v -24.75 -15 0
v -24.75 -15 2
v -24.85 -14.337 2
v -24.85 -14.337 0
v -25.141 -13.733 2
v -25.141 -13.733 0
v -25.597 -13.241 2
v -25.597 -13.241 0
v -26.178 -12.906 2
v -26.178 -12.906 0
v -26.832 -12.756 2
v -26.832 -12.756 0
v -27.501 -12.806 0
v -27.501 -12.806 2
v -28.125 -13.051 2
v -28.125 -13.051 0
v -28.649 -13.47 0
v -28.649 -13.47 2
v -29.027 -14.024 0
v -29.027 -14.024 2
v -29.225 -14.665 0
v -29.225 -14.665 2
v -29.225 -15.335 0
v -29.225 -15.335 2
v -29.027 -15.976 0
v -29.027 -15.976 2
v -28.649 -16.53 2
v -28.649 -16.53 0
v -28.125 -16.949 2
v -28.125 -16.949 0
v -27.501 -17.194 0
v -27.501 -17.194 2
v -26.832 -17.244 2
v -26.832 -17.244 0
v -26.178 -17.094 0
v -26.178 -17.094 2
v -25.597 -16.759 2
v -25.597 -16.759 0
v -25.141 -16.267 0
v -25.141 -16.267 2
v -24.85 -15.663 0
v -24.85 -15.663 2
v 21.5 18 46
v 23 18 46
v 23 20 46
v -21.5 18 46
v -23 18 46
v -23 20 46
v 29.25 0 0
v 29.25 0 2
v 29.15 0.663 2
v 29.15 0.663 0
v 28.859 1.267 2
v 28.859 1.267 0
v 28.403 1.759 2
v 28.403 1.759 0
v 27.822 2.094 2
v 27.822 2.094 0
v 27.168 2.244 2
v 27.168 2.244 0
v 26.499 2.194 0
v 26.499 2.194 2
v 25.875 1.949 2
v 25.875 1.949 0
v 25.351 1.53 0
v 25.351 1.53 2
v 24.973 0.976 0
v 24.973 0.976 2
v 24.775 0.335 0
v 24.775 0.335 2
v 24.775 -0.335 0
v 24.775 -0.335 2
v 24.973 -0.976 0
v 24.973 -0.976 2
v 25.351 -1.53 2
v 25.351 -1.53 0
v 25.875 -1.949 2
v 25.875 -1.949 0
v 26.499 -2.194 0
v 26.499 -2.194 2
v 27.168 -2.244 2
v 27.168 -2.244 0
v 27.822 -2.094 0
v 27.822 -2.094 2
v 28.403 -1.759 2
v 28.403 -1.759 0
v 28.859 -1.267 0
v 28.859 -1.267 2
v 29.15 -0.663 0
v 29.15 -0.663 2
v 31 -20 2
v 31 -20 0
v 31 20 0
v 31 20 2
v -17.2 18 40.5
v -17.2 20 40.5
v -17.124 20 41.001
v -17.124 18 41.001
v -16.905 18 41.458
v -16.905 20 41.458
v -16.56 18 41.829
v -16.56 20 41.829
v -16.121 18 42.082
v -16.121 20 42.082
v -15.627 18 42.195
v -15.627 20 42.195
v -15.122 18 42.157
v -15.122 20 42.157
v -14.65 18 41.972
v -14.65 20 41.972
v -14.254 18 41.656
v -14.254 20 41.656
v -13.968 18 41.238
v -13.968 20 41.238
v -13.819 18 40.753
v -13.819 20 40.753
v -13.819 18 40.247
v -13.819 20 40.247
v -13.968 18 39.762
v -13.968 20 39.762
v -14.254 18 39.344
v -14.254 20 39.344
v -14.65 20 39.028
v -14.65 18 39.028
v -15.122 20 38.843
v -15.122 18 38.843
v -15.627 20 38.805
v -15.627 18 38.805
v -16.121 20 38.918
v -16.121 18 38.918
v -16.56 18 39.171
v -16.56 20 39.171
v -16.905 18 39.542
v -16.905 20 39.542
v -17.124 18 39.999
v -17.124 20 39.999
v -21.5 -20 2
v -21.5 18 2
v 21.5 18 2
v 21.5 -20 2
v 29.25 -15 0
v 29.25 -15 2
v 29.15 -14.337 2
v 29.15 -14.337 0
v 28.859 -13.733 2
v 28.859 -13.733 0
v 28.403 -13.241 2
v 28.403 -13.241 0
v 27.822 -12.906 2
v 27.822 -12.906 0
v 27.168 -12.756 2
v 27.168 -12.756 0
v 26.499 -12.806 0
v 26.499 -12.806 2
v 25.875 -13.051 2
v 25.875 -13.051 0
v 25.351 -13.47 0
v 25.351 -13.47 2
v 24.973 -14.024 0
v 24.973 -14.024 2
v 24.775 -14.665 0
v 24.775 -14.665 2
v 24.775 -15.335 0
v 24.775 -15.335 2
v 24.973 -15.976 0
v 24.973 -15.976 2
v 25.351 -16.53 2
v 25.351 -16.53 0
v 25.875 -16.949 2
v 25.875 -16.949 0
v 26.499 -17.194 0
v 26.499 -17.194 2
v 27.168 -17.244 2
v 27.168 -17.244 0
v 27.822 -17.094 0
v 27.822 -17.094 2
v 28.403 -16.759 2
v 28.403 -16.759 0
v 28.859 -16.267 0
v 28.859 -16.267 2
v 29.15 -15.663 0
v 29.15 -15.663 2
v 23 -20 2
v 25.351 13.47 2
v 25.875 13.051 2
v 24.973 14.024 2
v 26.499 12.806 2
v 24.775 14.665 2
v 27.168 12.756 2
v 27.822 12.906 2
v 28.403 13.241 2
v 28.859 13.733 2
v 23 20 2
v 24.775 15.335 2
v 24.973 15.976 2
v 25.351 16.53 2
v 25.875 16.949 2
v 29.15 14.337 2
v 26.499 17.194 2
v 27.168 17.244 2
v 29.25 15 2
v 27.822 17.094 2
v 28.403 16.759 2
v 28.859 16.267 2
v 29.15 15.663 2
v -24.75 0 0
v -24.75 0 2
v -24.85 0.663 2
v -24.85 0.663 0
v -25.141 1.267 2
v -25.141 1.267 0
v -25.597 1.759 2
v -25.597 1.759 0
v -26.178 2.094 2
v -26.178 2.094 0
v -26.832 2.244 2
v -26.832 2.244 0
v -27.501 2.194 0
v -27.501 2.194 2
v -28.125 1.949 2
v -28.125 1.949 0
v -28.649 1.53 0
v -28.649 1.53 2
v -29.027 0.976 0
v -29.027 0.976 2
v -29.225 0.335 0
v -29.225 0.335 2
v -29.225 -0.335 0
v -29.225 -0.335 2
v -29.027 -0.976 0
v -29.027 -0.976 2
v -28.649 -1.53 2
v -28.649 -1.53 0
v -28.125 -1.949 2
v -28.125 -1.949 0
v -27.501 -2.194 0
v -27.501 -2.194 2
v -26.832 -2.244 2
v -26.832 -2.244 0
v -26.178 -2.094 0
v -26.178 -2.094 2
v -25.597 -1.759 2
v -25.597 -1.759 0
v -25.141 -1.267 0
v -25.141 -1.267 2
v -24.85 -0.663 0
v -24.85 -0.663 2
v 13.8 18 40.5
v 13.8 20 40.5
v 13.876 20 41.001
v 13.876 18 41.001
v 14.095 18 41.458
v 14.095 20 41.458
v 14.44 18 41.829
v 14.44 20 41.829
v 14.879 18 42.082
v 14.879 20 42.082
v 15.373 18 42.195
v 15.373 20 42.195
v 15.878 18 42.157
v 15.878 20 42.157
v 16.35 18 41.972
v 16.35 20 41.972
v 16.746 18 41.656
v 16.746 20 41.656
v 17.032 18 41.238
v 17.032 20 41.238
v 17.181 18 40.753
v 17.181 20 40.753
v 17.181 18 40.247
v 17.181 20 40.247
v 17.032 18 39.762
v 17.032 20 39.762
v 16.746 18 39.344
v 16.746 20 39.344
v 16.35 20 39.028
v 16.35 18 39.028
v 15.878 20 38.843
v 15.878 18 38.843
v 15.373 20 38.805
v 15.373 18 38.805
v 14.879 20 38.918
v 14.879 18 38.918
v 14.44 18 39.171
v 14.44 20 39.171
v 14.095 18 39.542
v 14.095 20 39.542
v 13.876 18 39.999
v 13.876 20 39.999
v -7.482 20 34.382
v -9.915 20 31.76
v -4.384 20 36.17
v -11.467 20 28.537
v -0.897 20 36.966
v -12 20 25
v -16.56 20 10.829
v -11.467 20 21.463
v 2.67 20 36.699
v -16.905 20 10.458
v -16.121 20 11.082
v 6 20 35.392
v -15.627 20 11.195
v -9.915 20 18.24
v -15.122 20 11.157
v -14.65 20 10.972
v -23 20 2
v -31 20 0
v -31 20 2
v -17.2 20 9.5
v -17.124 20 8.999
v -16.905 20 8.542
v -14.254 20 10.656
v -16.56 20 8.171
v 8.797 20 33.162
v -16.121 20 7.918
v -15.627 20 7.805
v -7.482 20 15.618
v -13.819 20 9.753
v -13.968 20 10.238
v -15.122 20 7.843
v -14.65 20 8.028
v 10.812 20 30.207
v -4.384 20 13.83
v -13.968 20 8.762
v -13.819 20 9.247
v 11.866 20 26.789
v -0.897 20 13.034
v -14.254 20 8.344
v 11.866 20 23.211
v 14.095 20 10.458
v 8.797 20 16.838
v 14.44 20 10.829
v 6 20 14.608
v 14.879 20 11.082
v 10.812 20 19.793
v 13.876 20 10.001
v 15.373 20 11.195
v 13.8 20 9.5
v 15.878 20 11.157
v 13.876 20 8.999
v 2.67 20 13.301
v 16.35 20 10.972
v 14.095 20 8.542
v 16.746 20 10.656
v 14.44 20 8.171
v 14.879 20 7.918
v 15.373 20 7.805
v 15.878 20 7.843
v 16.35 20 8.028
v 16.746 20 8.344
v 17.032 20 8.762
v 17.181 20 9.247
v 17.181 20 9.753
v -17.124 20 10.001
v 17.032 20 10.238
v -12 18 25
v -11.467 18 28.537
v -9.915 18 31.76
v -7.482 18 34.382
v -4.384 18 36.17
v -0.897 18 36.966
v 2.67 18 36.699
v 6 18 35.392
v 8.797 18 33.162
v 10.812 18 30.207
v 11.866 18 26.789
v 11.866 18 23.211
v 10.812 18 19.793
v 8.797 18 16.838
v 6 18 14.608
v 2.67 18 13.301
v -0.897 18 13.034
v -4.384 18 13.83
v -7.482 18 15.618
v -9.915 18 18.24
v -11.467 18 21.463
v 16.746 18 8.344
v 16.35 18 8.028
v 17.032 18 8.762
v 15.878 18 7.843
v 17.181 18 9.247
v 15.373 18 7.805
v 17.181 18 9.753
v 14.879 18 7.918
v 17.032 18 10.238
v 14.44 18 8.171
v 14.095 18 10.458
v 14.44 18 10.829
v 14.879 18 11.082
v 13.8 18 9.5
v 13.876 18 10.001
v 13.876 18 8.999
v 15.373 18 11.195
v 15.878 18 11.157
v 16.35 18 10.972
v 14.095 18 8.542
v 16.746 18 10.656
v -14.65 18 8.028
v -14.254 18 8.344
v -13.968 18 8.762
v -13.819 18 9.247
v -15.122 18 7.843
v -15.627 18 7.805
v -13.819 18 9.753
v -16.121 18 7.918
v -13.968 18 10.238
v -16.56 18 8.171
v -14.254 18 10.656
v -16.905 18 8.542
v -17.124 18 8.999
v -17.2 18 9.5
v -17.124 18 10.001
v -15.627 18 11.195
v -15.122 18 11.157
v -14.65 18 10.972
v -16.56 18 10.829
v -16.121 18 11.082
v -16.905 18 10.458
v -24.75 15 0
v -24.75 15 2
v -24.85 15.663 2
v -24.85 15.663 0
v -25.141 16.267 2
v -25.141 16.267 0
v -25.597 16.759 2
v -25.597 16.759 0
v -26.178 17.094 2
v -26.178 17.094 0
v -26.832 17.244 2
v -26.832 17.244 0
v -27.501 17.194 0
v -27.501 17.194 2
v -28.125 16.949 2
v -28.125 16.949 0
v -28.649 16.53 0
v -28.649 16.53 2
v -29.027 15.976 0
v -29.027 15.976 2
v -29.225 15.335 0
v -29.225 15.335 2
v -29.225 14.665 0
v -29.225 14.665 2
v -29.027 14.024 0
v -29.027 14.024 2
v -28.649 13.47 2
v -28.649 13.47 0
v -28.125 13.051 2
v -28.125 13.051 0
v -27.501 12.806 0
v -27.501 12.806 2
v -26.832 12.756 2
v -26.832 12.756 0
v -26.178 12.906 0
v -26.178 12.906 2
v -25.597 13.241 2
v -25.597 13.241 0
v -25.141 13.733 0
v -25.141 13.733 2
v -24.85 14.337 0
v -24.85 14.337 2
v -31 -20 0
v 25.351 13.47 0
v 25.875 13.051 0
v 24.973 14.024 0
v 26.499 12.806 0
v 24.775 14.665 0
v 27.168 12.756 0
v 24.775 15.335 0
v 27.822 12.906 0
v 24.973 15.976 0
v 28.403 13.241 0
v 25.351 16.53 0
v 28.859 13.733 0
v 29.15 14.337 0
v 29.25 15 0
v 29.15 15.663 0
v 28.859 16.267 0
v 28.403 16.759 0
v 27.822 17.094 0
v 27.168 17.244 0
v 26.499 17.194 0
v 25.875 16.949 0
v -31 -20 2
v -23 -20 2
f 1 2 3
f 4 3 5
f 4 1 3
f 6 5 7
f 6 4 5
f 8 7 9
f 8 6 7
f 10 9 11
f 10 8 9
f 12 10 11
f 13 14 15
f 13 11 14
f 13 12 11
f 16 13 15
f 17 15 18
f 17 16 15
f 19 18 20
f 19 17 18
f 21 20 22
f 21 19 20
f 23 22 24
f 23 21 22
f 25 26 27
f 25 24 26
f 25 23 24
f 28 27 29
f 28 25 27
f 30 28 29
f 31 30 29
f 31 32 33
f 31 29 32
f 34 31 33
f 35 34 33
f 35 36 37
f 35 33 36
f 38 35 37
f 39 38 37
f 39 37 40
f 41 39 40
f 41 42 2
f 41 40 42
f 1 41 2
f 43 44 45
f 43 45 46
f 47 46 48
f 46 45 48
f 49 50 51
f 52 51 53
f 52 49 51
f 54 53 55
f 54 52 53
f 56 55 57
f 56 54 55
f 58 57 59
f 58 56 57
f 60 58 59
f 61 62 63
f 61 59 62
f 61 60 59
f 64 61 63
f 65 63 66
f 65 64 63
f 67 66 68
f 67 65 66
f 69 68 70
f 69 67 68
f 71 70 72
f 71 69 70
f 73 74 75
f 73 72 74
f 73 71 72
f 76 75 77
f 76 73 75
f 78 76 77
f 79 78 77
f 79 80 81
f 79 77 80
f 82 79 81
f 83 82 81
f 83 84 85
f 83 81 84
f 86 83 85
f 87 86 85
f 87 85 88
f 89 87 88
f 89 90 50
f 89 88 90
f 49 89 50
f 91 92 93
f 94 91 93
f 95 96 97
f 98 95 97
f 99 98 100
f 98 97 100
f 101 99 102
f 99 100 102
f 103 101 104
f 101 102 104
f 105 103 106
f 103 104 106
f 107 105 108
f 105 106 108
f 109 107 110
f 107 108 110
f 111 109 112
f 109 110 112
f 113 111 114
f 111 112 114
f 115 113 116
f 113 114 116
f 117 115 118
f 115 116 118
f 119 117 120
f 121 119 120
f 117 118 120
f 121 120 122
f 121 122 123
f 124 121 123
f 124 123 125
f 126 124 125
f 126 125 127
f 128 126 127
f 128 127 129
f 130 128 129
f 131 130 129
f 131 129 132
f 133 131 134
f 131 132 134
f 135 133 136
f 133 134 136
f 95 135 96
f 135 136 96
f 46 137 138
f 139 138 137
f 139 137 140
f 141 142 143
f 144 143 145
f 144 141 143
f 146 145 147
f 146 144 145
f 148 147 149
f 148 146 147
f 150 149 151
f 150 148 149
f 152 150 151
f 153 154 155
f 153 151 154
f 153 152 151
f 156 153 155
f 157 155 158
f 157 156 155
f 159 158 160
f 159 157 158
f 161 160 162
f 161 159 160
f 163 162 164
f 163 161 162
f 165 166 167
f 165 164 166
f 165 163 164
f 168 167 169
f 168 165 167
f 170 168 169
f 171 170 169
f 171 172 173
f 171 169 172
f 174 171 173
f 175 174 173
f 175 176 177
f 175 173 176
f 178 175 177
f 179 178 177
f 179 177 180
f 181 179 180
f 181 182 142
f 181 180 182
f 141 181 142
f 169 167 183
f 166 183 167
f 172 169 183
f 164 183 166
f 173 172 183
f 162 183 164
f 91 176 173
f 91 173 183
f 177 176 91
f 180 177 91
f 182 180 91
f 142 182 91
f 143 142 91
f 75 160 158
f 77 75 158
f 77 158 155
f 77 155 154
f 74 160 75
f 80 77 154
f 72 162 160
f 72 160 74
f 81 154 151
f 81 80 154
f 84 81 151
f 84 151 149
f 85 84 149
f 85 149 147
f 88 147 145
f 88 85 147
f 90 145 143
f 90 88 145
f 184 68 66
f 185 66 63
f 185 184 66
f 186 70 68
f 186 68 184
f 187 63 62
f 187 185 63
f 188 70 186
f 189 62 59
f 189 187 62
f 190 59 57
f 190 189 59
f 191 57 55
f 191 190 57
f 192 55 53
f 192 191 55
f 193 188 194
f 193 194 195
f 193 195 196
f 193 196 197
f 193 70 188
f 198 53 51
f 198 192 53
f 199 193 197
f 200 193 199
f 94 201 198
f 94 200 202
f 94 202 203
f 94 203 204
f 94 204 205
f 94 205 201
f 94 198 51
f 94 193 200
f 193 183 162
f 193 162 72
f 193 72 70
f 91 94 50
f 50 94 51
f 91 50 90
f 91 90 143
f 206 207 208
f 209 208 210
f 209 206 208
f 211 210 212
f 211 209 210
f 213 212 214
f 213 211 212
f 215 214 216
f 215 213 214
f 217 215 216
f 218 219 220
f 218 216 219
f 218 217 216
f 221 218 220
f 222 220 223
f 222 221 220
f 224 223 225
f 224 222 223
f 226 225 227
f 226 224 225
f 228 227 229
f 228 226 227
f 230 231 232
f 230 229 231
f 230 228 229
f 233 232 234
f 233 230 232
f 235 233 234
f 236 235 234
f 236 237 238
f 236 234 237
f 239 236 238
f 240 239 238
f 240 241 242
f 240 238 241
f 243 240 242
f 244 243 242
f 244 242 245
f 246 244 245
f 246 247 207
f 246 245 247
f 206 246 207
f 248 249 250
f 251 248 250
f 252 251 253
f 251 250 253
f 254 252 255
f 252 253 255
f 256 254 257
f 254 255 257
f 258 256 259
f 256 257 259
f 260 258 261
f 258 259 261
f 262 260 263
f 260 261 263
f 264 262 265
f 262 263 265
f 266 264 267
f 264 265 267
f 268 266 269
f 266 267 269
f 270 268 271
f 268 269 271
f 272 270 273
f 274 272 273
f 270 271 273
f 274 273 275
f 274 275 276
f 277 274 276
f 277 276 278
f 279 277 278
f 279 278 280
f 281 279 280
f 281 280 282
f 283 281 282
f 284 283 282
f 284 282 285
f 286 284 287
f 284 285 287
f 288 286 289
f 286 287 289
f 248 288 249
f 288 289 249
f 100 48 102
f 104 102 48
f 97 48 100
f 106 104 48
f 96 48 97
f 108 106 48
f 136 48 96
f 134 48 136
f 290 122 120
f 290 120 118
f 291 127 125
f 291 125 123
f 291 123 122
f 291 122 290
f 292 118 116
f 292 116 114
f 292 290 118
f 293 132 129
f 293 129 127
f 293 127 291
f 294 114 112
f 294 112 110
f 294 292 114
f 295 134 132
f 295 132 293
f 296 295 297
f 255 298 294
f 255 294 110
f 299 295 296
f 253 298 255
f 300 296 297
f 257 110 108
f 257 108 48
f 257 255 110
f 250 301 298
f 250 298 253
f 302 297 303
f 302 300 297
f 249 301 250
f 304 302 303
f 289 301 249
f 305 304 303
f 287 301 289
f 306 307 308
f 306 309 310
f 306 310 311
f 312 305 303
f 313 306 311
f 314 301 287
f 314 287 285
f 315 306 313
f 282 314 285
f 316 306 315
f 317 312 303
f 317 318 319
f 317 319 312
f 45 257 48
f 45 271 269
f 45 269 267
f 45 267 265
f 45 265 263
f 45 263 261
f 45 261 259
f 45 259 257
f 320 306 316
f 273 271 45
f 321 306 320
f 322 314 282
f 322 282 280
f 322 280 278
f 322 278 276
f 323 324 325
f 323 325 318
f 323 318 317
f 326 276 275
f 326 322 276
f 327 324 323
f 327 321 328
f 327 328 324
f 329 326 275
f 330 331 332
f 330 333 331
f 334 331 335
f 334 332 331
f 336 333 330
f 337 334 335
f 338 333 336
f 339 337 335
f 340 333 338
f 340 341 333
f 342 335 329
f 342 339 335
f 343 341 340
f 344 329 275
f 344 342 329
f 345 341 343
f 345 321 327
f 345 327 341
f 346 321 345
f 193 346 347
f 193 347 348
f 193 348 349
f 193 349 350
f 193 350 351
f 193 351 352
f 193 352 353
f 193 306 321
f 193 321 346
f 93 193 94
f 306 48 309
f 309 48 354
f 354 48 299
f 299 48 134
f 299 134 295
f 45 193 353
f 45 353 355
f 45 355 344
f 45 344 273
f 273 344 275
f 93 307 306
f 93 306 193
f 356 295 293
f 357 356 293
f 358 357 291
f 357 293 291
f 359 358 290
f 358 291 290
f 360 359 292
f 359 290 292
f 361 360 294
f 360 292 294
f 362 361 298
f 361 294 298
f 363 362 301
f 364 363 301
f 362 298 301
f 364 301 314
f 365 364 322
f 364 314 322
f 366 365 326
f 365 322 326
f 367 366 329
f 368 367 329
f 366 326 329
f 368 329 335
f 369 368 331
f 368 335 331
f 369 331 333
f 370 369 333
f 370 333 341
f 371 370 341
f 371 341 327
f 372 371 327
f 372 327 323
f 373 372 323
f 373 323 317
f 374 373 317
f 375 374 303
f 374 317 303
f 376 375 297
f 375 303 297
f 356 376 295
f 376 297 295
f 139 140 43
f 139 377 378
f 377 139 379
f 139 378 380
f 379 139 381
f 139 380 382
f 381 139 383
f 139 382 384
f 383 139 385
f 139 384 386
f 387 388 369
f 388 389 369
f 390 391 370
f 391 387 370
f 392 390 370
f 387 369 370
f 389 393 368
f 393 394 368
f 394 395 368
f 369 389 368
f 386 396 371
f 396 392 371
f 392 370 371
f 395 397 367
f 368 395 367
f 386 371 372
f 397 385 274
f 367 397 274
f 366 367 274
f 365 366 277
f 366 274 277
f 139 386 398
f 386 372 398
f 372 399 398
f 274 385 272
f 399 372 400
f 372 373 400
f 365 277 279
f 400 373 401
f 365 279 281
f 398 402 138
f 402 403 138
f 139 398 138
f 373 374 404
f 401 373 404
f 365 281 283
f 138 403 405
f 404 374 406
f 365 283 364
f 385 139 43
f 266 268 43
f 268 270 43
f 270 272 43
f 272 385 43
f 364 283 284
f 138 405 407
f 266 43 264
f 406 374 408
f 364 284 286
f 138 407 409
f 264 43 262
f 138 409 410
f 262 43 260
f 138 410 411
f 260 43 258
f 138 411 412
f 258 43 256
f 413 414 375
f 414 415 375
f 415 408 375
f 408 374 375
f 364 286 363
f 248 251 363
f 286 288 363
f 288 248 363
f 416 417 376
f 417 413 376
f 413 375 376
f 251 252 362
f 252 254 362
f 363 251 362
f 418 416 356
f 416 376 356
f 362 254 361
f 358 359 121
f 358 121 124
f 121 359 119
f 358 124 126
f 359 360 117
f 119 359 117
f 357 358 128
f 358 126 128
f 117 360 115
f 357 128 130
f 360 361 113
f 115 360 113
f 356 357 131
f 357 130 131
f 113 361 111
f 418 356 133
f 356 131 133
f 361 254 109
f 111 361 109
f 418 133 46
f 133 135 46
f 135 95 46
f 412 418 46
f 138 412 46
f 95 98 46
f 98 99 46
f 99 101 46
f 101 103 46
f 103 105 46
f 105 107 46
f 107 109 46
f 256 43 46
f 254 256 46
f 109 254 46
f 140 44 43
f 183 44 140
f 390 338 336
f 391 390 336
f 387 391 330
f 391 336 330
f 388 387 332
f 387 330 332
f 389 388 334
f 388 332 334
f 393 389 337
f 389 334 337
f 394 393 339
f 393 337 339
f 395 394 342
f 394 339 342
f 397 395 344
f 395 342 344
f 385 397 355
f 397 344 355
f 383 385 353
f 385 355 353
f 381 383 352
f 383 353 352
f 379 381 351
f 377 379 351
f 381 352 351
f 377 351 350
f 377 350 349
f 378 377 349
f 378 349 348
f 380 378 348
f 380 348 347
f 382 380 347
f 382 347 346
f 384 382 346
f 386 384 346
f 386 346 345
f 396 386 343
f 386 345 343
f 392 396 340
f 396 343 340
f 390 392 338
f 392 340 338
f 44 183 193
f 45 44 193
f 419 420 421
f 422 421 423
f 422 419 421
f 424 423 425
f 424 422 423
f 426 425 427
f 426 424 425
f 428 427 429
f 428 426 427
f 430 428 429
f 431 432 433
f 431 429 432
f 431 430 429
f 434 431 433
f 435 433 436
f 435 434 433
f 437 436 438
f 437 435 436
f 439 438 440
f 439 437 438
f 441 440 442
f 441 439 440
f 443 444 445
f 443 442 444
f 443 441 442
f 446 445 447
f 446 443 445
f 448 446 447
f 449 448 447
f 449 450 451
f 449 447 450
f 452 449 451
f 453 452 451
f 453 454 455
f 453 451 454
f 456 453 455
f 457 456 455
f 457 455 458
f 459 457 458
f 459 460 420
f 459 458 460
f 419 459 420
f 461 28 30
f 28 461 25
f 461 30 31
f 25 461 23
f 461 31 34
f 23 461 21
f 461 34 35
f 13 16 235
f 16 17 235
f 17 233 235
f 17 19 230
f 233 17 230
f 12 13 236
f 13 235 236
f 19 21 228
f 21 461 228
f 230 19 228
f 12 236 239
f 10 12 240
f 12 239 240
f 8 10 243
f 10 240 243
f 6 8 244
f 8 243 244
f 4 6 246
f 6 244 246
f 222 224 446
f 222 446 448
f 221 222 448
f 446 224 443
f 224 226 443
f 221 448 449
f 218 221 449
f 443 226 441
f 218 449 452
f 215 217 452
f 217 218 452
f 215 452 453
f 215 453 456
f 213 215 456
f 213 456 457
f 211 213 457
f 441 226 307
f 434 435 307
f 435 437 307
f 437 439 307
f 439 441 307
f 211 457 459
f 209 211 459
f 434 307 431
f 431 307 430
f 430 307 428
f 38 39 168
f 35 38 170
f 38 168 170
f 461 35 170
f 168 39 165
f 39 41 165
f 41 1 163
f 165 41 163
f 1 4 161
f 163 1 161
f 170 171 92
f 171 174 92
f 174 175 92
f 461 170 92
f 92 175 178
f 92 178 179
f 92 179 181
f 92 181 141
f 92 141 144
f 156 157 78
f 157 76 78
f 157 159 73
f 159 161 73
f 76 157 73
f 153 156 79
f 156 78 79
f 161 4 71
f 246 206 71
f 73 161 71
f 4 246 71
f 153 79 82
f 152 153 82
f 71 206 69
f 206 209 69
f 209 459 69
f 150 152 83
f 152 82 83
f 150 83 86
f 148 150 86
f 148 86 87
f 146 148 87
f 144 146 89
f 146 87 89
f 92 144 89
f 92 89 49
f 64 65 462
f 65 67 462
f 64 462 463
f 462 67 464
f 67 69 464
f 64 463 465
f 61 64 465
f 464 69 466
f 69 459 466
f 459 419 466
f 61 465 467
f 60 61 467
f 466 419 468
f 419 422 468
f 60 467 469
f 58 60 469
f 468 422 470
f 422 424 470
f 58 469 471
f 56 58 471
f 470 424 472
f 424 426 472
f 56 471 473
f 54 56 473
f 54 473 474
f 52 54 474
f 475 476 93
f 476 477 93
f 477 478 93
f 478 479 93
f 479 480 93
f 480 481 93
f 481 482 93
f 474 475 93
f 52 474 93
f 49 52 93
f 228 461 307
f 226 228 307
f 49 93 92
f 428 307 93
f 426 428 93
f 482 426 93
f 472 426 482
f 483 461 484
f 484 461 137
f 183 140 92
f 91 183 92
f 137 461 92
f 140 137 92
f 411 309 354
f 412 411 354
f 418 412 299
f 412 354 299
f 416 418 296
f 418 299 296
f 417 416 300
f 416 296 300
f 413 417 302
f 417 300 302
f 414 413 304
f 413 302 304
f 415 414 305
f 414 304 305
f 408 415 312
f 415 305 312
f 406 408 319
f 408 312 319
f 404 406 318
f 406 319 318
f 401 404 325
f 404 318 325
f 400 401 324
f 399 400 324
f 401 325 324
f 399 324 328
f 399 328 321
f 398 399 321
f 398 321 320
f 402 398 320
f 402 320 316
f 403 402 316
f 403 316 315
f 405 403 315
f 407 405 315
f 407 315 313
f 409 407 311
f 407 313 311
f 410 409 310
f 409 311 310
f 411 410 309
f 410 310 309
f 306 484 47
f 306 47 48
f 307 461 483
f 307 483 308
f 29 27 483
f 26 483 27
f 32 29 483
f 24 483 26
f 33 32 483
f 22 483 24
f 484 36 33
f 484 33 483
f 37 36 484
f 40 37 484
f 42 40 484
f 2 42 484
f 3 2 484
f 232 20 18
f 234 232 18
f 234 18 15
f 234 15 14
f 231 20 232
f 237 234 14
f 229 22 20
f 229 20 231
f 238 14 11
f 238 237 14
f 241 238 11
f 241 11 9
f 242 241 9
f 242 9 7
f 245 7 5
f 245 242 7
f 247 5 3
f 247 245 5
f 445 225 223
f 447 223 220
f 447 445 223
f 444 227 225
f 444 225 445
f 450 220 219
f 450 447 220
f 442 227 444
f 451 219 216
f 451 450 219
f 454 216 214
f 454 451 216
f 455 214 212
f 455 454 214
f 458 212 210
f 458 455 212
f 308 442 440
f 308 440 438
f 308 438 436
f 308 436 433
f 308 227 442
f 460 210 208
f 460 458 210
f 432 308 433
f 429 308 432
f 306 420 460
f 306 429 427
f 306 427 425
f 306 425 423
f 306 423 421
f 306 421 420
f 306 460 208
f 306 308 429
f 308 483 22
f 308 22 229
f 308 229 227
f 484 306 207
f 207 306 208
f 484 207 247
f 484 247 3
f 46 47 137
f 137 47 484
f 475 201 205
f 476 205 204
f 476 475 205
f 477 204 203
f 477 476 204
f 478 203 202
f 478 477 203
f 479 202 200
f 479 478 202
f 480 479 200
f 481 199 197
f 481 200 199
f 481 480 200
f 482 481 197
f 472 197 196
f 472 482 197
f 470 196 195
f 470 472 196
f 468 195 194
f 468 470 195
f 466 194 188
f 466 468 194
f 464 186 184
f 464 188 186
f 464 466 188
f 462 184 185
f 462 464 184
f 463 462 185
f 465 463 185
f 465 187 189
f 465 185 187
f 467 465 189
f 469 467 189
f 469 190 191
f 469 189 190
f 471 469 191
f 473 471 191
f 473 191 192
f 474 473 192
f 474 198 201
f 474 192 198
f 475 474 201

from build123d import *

# Parameters (mm, degrees)
F0_W     = 62
F0_H     = 40
F0_R     = 2.25
F1_DEPTH = 2
F3_W     = 46
F3_H     = 44
F3_R     = 1.7
F3_R_2   = 12
F4_DEPTH = 2
F6_DEPTH = 1.5


with BuildPart() as f1:
    # F0 (on Top) → F1 (new body)
    with BuildSketch(Plane.XY):
        Rectangle(F0_W, F0_H)
        with Locations((-27, -15)):
            Circle(F0_R, mode=Mode.SUBTRACT)
        with Locations((27, -15)):
            Circle(F0_R, mode=Mode.SUBTRACT)
        with Locations((-27, 0)):
            Circle(F0_R, mode=Mode.SUBTRACT)
        with Locations((-27, 15)):
            Circle(F0_R, mode=Mode.SUBTRACT)
        with Locations((27, 0)):
            Circle(F0_R, mode=Mode.SUBTRACT)
        with Locations((27, 15)):
            Circle(F0_R, mode=Mode.SUBTRACT)
    extrude(amount=F1_DEPTH)

    # F3 (on offset) → F4 (join)
    with BuildSketch(Plane(origin=(0, 20, 0), x_dir=(-1, 0, 0), z_dir=(0, 1, 0))):
        with Locations((0, 24)):
            Rectangle(F3_W, F3_H)
        with Locations((-15.5, 9.5)):
            Circle(F3_R, mode=Mode.SUBTRACT)
        with Locations((15.5, 9.5)):
            Circle(F3_R, mode=Mode.SUBTRACT)
        with Locations((-15.5, 40.5)):
            Circle(F3_R, mode=Mode.SUBTRACT)
        with Locations((0, 25)):
            Circle(F3_R_2, mode=Mode.SUBTRACT)
        with Locations((15.5, 40.5)):
            Circle(F3_R, mode=Mode.SUBTRACT)
    extrude(amount=-F4_DEPTH)

    # F5 (on face) → F6 (join)
    with BuildSketch(Plane.YZ.offset(23)):
        Polygon((18, 2), (18, 46), (-20, 2), align=None)
    extrude(amount=-F6_DEPTH)

    # F7: F1 across plane


with BuildPart() as f1_1:
    add(f1.part)
    add(f1.part.mirror(Plane.YZ))


solid = f1_1.part
